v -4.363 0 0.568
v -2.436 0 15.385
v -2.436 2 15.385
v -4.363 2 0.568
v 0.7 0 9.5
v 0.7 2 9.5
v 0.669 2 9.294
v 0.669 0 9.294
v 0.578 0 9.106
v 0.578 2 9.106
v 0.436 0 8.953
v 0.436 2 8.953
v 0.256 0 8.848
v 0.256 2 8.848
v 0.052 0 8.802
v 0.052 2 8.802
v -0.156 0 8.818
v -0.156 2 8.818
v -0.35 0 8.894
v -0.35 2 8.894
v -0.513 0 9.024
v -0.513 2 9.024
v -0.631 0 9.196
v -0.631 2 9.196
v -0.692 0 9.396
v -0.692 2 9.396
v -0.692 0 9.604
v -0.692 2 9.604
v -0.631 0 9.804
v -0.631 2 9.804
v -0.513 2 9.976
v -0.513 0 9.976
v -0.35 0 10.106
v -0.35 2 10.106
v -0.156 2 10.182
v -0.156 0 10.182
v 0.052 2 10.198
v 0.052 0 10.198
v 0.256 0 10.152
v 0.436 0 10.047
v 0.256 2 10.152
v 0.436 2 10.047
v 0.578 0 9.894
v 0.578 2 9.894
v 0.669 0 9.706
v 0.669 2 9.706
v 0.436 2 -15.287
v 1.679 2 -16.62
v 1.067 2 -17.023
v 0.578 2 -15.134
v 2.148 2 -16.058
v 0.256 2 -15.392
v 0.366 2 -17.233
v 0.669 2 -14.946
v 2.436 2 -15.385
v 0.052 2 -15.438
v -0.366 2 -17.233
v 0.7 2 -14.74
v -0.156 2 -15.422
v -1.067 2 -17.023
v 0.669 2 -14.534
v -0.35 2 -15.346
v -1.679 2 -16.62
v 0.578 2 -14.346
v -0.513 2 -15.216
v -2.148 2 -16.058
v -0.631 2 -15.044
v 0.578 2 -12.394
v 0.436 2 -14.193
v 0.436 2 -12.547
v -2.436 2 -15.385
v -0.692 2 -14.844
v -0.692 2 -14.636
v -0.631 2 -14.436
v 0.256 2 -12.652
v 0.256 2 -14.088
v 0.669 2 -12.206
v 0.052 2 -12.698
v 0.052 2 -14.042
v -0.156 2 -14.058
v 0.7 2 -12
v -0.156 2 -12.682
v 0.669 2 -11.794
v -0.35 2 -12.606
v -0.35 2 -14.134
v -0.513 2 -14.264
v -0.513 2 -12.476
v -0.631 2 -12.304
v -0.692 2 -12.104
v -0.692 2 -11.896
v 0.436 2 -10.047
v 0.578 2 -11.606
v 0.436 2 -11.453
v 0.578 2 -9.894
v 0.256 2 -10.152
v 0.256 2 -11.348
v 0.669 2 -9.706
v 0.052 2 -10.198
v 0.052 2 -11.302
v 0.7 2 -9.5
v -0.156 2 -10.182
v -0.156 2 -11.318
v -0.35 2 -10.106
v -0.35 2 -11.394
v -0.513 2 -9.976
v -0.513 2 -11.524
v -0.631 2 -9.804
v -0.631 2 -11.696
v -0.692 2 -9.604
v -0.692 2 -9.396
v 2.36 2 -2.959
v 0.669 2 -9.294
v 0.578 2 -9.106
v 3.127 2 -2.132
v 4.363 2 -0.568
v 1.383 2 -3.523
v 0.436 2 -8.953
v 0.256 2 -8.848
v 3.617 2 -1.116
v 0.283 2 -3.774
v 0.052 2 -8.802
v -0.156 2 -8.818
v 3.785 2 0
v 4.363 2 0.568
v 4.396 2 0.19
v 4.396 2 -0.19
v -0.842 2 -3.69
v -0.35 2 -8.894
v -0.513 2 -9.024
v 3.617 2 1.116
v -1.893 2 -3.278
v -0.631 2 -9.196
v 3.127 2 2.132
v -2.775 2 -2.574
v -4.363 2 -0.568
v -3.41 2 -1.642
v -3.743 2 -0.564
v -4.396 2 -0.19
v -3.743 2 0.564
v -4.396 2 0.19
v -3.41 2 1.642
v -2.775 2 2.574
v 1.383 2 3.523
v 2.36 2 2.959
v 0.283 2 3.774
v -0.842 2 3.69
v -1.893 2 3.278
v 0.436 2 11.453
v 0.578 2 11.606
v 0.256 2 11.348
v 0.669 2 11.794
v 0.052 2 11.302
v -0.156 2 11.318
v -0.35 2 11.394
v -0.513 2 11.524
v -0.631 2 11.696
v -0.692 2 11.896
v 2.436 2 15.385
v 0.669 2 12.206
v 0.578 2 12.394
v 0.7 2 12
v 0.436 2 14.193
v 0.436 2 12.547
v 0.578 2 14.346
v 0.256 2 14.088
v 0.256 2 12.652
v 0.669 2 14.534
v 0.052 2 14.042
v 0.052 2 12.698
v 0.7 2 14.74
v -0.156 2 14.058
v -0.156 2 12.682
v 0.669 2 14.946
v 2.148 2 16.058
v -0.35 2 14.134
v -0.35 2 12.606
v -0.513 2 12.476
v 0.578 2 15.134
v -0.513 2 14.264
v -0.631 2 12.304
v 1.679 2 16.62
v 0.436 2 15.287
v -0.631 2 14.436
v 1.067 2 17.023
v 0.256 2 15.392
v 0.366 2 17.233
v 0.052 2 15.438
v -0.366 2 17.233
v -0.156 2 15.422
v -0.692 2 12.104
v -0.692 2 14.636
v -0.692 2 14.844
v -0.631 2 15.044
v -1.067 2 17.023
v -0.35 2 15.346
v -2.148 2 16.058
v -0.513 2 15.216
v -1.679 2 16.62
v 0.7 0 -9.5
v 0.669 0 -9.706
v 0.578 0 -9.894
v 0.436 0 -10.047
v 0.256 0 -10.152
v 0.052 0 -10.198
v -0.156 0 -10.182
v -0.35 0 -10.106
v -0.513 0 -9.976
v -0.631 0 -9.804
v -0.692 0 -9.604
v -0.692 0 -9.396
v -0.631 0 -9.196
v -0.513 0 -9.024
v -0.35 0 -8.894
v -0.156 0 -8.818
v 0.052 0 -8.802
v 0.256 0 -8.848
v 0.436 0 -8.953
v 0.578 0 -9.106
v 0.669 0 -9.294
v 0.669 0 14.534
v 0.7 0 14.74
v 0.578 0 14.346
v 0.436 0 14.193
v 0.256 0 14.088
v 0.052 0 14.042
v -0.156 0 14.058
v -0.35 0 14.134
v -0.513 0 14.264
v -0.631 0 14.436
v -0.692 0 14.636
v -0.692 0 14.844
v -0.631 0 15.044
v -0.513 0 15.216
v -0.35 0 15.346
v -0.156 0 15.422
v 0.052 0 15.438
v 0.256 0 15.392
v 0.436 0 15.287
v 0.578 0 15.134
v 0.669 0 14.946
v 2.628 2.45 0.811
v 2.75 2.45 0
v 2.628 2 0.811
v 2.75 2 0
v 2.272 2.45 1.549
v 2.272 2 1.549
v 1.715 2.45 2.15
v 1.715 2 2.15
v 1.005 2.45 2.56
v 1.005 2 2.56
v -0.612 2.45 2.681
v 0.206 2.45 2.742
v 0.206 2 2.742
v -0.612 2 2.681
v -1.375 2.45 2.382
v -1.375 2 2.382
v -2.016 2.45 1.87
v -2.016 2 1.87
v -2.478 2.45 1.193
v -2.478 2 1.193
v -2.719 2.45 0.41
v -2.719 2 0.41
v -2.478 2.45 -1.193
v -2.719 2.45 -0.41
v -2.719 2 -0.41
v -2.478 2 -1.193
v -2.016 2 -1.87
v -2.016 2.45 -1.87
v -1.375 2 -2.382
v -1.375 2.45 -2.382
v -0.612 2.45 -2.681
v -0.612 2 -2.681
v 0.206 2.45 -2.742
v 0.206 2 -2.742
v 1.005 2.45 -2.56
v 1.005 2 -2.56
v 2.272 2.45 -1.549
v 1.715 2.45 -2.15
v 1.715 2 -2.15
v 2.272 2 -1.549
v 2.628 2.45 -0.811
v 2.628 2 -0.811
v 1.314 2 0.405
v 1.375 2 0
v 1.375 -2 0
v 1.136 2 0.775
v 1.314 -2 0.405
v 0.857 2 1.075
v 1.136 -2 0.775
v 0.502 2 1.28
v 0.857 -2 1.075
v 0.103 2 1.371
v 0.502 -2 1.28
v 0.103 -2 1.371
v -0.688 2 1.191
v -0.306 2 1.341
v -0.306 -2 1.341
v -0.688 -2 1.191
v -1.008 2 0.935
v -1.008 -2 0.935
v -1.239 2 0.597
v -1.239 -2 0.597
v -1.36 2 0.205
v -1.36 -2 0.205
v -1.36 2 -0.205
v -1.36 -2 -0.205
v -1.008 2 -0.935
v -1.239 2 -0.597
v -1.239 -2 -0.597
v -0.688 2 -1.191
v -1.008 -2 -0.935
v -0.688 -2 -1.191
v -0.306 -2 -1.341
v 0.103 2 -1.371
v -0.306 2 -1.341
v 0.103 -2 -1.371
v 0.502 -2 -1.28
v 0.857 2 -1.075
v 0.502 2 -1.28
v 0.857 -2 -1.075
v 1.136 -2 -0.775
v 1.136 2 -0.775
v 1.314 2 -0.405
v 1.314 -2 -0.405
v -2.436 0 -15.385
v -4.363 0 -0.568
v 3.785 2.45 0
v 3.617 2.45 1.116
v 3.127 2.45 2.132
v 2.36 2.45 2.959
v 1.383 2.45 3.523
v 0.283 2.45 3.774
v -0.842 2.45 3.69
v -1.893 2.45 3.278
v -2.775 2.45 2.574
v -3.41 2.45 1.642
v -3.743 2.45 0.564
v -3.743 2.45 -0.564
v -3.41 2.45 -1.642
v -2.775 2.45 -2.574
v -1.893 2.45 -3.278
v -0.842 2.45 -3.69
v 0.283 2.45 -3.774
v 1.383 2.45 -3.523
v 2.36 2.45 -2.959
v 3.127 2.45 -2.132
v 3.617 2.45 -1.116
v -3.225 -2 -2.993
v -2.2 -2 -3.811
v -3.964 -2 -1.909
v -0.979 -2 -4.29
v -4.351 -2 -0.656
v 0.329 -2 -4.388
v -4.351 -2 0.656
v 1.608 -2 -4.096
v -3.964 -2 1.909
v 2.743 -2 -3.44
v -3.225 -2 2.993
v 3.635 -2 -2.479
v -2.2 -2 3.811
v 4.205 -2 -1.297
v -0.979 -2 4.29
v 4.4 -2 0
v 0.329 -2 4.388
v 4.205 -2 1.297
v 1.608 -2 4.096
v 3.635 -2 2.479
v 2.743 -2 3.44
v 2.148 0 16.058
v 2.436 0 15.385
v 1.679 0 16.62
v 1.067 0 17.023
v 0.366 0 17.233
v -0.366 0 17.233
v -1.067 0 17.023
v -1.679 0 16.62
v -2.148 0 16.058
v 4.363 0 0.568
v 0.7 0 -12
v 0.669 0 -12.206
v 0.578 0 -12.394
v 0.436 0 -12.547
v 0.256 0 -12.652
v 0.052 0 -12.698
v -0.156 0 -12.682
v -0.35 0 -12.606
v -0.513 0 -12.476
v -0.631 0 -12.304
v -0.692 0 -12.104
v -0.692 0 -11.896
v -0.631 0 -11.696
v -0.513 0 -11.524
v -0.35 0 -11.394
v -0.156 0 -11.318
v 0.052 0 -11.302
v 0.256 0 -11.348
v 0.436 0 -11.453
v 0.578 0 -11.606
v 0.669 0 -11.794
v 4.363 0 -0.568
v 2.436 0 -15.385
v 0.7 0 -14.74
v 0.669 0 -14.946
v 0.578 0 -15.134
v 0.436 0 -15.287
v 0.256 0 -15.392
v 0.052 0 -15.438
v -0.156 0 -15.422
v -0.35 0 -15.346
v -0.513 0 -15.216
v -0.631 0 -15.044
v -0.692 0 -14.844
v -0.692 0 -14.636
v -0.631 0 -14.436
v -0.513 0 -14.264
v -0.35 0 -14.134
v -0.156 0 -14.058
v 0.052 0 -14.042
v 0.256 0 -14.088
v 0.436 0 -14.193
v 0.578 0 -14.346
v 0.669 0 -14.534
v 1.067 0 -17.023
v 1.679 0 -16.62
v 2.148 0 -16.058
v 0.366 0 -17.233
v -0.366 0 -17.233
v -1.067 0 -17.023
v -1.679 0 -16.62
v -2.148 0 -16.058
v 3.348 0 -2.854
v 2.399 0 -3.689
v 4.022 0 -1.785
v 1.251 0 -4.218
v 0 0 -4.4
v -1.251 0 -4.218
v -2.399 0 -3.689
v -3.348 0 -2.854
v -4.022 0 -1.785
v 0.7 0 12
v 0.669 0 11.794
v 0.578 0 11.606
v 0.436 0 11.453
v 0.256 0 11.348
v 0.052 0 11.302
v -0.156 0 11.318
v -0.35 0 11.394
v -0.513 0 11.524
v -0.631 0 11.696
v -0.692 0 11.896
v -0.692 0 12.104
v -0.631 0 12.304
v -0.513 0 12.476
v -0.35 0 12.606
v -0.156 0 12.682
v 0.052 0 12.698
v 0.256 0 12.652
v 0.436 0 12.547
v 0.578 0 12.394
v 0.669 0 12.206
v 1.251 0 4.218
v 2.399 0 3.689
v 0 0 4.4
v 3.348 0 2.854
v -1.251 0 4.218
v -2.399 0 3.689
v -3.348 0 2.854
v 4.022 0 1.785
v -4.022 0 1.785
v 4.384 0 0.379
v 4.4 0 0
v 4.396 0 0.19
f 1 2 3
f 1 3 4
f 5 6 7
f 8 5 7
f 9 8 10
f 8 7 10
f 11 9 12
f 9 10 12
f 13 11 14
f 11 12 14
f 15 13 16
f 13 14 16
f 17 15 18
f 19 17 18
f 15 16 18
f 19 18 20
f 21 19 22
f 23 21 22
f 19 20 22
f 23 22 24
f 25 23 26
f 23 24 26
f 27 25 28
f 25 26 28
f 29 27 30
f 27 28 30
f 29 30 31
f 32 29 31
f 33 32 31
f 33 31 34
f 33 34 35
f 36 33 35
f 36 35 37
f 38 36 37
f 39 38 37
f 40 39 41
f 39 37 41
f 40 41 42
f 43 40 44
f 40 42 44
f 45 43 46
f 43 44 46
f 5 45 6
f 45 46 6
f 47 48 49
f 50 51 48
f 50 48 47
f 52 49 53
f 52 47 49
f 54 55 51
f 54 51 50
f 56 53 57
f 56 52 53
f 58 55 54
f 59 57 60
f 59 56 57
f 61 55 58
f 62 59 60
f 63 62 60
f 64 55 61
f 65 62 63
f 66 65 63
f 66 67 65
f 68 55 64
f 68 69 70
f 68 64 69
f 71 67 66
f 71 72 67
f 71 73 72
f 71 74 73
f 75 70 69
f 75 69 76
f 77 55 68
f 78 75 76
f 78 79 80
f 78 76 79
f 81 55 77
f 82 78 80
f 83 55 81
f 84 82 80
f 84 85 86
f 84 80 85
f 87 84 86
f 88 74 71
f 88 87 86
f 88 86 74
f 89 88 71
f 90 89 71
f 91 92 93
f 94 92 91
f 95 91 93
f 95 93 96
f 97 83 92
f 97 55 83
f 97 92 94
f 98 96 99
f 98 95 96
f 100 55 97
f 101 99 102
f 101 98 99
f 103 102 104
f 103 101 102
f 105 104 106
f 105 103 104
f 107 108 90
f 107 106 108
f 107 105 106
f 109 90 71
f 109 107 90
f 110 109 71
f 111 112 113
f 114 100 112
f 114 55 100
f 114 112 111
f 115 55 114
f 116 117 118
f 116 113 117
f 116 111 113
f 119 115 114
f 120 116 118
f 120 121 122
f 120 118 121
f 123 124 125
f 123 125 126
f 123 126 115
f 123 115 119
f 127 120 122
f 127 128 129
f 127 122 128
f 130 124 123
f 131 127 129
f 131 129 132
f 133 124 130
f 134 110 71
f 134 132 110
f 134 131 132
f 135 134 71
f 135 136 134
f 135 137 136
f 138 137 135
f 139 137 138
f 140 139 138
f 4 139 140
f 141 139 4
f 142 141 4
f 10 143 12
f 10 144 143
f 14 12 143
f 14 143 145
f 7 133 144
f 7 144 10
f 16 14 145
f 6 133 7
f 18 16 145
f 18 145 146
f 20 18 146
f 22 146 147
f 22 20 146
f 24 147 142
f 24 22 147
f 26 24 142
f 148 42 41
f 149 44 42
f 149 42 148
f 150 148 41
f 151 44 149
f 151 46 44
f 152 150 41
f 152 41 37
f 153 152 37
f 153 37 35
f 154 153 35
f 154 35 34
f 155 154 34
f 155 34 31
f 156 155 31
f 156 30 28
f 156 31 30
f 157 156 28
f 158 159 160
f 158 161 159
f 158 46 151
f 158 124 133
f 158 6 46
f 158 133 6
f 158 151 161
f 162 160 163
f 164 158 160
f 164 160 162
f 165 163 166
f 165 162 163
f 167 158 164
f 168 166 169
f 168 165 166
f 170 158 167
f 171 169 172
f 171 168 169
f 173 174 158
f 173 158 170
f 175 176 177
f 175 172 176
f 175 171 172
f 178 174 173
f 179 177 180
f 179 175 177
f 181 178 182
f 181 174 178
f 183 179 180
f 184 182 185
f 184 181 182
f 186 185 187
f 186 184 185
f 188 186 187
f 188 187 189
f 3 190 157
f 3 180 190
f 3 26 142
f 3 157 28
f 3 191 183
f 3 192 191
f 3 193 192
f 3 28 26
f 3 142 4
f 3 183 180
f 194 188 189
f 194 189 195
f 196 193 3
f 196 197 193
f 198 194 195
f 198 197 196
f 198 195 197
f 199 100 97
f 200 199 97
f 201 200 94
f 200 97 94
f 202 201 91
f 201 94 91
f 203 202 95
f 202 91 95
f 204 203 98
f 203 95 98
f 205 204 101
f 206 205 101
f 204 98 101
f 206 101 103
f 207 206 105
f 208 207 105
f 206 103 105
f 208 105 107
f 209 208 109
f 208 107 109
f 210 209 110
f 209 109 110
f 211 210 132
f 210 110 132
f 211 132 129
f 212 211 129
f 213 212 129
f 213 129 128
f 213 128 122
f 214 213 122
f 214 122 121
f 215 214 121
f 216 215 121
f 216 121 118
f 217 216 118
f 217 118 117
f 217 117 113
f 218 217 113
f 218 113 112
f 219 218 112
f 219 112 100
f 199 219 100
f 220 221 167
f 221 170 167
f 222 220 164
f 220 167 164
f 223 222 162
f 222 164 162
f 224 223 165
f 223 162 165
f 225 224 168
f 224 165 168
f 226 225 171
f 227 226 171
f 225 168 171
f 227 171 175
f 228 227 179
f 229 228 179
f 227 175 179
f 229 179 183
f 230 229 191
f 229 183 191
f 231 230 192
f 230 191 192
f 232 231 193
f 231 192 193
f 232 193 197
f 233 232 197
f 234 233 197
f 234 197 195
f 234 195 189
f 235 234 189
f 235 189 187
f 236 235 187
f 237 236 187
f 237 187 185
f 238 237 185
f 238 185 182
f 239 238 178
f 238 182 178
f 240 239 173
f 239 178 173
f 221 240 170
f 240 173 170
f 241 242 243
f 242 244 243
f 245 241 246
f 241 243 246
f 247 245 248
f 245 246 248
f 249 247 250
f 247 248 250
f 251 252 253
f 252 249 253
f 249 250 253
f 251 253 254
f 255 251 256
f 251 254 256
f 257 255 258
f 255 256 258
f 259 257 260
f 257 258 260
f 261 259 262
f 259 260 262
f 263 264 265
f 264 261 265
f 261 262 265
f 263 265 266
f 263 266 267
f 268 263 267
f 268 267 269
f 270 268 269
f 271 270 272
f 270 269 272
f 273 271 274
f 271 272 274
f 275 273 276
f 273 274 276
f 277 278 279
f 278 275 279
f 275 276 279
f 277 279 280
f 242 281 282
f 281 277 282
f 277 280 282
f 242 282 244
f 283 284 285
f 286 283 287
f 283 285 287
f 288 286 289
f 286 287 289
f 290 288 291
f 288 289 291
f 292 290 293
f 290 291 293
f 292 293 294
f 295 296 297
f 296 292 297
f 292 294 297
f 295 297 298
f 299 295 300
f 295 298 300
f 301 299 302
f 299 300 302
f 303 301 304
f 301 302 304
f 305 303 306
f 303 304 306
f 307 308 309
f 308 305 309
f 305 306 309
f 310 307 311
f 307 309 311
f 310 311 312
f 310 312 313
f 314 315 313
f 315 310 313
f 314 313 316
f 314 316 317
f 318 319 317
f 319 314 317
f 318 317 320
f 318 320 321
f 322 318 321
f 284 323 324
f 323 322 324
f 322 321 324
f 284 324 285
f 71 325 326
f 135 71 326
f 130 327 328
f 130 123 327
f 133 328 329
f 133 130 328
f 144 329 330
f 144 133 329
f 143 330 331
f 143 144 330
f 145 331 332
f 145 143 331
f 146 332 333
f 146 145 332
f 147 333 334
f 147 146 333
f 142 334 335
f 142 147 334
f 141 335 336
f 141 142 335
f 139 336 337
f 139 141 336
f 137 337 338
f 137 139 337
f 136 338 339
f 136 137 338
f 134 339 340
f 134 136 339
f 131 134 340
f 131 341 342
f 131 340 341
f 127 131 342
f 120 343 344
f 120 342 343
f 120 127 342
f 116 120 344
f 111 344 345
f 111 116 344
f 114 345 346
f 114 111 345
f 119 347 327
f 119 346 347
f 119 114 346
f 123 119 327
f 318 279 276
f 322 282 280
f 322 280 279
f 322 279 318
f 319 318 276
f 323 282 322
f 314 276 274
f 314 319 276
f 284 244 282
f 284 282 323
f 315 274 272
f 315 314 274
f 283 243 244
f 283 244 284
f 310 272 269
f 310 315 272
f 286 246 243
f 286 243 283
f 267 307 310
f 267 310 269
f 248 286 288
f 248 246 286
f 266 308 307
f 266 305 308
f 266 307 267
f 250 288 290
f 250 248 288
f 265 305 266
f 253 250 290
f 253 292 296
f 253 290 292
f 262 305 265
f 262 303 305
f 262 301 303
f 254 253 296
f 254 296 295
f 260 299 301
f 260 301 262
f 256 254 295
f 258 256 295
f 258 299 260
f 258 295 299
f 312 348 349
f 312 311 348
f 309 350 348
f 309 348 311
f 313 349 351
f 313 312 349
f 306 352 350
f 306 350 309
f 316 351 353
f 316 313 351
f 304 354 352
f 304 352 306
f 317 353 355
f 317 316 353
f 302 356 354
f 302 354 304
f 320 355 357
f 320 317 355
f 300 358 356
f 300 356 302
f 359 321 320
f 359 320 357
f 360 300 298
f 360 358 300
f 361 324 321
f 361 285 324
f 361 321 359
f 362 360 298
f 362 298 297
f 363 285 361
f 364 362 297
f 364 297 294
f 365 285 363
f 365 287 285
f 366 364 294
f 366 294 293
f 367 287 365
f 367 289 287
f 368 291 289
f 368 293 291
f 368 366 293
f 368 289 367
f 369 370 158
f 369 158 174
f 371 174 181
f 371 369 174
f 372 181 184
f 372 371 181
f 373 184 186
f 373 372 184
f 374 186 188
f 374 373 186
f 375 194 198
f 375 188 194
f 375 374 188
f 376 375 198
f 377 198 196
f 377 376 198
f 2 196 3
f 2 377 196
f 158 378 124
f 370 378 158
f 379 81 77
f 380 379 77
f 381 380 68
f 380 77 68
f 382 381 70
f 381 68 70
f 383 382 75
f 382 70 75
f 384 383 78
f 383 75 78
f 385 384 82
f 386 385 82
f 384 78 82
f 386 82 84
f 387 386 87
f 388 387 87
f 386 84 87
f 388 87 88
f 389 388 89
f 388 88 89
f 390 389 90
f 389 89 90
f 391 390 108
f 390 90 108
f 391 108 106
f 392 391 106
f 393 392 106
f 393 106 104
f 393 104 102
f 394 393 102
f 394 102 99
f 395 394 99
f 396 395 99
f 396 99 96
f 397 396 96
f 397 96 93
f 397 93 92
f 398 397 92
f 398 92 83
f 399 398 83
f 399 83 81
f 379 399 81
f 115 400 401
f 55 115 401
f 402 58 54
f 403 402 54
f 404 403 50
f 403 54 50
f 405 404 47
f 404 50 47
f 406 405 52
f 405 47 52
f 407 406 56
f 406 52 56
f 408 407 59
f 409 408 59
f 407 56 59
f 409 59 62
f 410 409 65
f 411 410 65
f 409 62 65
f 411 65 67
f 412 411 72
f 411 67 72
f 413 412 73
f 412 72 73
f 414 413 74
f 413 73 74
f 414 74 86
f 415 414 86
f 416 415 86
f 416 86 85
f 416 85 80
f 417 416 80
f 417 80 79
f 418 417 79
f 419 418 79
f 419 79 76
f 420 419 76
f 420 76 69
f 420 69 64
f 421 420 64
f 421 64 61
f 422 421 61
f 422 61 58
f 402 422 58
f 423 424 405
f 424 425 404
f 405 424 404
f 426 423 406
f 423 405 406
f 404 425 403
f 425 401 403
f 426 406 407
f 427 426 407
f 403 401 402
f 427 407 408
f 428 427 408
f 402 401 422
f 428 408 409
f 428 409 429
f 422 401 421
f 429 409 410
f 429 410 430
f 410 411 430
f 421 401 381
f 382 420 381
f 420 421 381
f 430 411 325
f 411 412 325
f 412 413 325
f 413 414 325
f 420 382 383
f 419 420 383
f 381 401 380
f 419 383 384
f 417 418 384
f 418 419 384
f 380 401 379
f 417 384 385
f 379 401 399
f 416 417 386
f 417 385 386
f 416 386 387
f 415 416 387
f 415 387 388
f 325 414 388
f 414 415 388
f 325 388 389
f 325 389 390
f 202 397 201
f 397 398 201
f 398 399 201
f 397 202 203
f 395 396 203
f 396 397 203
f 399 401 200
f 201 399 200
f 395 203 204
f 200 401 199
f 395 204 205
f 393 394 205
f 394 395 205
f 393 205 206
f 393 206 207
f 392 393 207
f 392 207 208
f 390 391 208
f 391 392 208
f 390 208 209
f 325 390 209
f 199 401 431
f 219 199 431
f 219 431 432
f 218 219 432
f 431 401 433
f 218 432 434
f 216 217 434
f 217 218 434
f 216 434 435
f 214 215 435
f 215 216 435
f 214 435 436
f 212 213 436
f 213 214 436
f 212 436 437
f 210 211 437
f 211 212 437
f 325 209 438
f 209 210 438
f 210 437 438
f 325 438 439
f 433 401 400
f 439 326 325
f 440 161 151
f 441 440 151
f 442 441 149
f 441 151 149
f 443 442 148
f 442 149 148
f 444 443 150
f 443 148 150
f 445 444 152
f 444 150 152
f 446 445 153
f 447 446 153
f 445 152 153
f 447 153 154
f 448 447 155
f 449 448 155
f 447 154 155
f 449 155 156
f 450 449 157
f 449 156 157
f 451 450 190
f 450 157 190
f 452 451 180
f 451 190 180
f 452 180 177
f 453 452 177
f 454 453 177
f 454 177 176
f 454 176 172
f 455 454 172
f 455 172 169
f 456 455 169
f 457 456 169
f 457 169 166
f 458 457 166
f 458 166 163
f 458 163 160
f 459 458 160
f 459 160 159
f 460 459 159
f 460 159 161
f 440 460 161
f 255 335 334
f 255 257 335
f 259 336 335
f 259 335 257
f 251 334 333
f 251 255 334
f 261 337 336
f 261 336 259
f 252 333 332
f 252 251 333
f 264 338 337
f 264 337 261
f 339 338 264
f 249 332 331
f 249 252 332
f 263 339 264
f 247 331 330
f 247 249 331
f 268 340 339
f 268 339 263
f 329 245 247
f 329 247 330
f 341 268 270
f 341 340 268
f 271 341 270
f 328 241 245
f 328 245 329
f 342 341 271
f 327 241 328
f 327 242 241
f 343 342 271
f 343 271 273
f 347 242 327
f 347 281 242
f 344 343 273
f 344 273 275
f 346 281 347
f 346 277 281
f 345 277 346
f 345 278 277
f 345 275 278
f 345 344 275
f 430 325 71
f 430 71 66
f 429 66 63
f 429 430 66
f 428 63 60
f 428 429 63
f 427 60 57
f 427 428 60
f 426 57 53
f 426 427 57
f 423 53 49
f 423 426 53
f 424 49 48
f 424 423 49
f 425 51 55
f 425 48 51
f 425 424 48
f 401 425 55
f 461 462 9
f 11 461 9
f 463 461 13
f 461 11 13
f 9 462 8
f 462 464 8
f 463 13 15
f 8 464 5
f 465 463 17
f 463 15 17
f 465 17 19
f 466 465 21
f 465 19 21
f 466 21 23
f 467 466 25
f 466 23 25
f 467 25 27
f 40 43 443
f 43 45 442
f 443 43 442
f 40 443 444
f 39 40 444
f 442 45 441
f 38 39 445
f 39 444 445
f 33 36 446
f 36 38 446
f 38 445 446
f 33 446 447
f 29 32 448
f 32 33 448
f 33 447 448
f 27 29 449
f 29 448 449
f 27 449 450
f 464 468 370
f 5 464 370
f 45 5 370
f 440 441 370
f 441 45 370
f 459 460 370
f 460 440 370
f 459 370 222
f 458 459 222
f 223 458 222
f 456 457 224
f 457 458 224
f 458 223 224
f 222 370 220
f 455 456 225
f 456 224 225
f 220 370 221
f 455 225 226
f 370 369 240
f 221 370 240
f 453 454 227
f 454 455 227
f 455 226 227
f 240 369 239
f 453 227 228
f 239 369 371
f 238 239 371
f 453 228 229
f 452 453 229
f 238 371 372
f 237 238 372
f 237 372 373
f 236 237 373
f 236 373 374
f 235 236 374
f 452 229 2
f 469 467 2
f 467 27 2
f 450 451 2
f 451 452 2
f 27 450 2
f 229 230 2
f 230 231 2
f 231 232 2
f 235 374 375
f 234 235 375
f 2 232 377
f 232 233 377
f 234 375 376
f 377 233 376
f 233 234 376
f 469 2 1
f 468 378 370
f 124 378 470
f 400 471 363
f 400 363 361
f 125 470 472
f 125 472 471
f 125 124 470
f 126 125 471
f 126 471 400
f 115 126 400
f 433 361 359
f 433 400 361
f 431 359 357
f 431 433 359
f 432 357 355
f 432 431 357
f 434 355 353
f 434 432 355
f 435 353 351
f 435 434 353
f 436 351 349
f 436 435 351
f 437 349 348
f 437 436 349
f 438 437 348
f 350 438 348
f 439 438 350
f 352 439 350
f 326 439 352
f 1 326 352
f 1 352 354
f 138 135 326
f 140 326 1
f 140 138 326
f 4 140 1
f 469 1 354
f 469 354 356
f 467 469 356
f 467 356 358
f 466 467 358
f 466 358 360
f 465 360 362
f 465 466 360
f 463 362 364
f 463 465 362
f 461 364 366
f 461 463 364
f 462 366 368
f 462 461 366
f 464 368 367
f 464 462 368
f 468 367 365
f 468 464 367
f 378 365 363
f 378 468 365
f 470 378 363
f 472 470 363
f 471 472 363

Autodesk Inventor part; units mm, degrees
ref_plane "YZ Plane" through (0, 0, 0) normal (1, 0, 0) x (0, 1, 0)
ref_plane "XZ Plane" through (0, 0, 0) normal (0, 1, 0) x (-1, 0, 0)
ref_plane "XY Plane" through (0, 0, 0) normal (0, 0, 1) x (1, 0, 0)
sketch "Sketch1" plane through (0, 0, 0) normal (0, 1, 0) x (-1, 0, 0)
  line L0 (0, 0) -> (0, -14.74)
  arc A0 (-2.52, -14.74) -> (2.52, -14.74) centre (0, -14.74) ccw
  line L1 (2.4362, -15.3846) -> (4.3633, -0.5675)
  line L2 (-4.3633, -0.5675) -> (-2.4362, -15.3846)
  line L3 (0, 0) -> (0, 14.74)
  arc A1 (2.52, 14.74) -> (-2.52, 14.74) centre (0, 14.74) ccw
  circle A2 centre (0, 0) radius 4.4
  line L4 (2.4362, 15.3846) -> (4.3633, 0.5675)
  line L5 (-4.3633, 0.5675) -> (-2.4362, 15.3846)
  point P0 (4.3633, -0.5675)
  dimension "d2" = 2.52
extrude "Extrusion1" add sketch "Sketch1" along normal blind 2 contours L3 A2 L0 | L0 A2 L3 | A2 L1 A0 L2 | A2 L5 A1 L4
sketch "Sketch2" plane through (0, 2, 0) normal (0, 1, 0) x (1, 0, 0)
  circle A0 centre (0, 14.74) radius 0.7
  circle A1 centre (0, 12) radius 0.7
  circle A2 centre (0, 9.5) radius 0.7
  circle A3 centre (0, -14.74) radius 0.7
  circle A4 centre (0, -12) radius 0.7
  circle A5 centre (0, -9.5) radius 0.7
  point P0 (0, 0)
  dimension "d7" = 1.4
  dimension "d9" = 1.4
  dimension "d11" = 1.4
extrude "Extrusion2" cut sketch "Sketch2" against normal blind 2
sketch "Sketch3" plane through (0, 2, 0) normal (0, 1, 0) x (1, 0, 0)
  circle A0 centre (0, 0) radius 1.375
  dimension "d14" = 2.75
extrude "Extrusion3" cut sketch "Sketch3" against normal blind 2
sketch "Sketch4" plane through (0, 2, 0) normal (0, 1, 0) x (1, 0, 0)
  circle A0 centre (0, 0) radius 2.75
  circle A1 centre (0, 0) radius 3.785
  dimension "d18" = 5.5
  dimension "d19" = 7.57
extrude "Extrusion4" add sketch "Sketch4" along normal blind 0.45
sketch "Sketch5" plane through (0, 0, 0) normal (0, -1, 0) x (1, 0, 0)
  circle A0 centre (0, 0) radius 4.4
  dimension "d22" = 8.8
extrude "Extrusion5" add sketch "Sketch5" along normal blind 2
sketch "Sketch6" plane through (0, -2, 0) normal (0, -1, 0) x (1, 0, 0)
  circle A0 centre (0, 0) radius 1.375
  dimension "d25" = 2.75
extrude "Extrusion6" cut sketch "Sketch6" against normal blind 2
properties part number "MMAE 232 Assignment 2_White Propellor - Dylan Tamras"
